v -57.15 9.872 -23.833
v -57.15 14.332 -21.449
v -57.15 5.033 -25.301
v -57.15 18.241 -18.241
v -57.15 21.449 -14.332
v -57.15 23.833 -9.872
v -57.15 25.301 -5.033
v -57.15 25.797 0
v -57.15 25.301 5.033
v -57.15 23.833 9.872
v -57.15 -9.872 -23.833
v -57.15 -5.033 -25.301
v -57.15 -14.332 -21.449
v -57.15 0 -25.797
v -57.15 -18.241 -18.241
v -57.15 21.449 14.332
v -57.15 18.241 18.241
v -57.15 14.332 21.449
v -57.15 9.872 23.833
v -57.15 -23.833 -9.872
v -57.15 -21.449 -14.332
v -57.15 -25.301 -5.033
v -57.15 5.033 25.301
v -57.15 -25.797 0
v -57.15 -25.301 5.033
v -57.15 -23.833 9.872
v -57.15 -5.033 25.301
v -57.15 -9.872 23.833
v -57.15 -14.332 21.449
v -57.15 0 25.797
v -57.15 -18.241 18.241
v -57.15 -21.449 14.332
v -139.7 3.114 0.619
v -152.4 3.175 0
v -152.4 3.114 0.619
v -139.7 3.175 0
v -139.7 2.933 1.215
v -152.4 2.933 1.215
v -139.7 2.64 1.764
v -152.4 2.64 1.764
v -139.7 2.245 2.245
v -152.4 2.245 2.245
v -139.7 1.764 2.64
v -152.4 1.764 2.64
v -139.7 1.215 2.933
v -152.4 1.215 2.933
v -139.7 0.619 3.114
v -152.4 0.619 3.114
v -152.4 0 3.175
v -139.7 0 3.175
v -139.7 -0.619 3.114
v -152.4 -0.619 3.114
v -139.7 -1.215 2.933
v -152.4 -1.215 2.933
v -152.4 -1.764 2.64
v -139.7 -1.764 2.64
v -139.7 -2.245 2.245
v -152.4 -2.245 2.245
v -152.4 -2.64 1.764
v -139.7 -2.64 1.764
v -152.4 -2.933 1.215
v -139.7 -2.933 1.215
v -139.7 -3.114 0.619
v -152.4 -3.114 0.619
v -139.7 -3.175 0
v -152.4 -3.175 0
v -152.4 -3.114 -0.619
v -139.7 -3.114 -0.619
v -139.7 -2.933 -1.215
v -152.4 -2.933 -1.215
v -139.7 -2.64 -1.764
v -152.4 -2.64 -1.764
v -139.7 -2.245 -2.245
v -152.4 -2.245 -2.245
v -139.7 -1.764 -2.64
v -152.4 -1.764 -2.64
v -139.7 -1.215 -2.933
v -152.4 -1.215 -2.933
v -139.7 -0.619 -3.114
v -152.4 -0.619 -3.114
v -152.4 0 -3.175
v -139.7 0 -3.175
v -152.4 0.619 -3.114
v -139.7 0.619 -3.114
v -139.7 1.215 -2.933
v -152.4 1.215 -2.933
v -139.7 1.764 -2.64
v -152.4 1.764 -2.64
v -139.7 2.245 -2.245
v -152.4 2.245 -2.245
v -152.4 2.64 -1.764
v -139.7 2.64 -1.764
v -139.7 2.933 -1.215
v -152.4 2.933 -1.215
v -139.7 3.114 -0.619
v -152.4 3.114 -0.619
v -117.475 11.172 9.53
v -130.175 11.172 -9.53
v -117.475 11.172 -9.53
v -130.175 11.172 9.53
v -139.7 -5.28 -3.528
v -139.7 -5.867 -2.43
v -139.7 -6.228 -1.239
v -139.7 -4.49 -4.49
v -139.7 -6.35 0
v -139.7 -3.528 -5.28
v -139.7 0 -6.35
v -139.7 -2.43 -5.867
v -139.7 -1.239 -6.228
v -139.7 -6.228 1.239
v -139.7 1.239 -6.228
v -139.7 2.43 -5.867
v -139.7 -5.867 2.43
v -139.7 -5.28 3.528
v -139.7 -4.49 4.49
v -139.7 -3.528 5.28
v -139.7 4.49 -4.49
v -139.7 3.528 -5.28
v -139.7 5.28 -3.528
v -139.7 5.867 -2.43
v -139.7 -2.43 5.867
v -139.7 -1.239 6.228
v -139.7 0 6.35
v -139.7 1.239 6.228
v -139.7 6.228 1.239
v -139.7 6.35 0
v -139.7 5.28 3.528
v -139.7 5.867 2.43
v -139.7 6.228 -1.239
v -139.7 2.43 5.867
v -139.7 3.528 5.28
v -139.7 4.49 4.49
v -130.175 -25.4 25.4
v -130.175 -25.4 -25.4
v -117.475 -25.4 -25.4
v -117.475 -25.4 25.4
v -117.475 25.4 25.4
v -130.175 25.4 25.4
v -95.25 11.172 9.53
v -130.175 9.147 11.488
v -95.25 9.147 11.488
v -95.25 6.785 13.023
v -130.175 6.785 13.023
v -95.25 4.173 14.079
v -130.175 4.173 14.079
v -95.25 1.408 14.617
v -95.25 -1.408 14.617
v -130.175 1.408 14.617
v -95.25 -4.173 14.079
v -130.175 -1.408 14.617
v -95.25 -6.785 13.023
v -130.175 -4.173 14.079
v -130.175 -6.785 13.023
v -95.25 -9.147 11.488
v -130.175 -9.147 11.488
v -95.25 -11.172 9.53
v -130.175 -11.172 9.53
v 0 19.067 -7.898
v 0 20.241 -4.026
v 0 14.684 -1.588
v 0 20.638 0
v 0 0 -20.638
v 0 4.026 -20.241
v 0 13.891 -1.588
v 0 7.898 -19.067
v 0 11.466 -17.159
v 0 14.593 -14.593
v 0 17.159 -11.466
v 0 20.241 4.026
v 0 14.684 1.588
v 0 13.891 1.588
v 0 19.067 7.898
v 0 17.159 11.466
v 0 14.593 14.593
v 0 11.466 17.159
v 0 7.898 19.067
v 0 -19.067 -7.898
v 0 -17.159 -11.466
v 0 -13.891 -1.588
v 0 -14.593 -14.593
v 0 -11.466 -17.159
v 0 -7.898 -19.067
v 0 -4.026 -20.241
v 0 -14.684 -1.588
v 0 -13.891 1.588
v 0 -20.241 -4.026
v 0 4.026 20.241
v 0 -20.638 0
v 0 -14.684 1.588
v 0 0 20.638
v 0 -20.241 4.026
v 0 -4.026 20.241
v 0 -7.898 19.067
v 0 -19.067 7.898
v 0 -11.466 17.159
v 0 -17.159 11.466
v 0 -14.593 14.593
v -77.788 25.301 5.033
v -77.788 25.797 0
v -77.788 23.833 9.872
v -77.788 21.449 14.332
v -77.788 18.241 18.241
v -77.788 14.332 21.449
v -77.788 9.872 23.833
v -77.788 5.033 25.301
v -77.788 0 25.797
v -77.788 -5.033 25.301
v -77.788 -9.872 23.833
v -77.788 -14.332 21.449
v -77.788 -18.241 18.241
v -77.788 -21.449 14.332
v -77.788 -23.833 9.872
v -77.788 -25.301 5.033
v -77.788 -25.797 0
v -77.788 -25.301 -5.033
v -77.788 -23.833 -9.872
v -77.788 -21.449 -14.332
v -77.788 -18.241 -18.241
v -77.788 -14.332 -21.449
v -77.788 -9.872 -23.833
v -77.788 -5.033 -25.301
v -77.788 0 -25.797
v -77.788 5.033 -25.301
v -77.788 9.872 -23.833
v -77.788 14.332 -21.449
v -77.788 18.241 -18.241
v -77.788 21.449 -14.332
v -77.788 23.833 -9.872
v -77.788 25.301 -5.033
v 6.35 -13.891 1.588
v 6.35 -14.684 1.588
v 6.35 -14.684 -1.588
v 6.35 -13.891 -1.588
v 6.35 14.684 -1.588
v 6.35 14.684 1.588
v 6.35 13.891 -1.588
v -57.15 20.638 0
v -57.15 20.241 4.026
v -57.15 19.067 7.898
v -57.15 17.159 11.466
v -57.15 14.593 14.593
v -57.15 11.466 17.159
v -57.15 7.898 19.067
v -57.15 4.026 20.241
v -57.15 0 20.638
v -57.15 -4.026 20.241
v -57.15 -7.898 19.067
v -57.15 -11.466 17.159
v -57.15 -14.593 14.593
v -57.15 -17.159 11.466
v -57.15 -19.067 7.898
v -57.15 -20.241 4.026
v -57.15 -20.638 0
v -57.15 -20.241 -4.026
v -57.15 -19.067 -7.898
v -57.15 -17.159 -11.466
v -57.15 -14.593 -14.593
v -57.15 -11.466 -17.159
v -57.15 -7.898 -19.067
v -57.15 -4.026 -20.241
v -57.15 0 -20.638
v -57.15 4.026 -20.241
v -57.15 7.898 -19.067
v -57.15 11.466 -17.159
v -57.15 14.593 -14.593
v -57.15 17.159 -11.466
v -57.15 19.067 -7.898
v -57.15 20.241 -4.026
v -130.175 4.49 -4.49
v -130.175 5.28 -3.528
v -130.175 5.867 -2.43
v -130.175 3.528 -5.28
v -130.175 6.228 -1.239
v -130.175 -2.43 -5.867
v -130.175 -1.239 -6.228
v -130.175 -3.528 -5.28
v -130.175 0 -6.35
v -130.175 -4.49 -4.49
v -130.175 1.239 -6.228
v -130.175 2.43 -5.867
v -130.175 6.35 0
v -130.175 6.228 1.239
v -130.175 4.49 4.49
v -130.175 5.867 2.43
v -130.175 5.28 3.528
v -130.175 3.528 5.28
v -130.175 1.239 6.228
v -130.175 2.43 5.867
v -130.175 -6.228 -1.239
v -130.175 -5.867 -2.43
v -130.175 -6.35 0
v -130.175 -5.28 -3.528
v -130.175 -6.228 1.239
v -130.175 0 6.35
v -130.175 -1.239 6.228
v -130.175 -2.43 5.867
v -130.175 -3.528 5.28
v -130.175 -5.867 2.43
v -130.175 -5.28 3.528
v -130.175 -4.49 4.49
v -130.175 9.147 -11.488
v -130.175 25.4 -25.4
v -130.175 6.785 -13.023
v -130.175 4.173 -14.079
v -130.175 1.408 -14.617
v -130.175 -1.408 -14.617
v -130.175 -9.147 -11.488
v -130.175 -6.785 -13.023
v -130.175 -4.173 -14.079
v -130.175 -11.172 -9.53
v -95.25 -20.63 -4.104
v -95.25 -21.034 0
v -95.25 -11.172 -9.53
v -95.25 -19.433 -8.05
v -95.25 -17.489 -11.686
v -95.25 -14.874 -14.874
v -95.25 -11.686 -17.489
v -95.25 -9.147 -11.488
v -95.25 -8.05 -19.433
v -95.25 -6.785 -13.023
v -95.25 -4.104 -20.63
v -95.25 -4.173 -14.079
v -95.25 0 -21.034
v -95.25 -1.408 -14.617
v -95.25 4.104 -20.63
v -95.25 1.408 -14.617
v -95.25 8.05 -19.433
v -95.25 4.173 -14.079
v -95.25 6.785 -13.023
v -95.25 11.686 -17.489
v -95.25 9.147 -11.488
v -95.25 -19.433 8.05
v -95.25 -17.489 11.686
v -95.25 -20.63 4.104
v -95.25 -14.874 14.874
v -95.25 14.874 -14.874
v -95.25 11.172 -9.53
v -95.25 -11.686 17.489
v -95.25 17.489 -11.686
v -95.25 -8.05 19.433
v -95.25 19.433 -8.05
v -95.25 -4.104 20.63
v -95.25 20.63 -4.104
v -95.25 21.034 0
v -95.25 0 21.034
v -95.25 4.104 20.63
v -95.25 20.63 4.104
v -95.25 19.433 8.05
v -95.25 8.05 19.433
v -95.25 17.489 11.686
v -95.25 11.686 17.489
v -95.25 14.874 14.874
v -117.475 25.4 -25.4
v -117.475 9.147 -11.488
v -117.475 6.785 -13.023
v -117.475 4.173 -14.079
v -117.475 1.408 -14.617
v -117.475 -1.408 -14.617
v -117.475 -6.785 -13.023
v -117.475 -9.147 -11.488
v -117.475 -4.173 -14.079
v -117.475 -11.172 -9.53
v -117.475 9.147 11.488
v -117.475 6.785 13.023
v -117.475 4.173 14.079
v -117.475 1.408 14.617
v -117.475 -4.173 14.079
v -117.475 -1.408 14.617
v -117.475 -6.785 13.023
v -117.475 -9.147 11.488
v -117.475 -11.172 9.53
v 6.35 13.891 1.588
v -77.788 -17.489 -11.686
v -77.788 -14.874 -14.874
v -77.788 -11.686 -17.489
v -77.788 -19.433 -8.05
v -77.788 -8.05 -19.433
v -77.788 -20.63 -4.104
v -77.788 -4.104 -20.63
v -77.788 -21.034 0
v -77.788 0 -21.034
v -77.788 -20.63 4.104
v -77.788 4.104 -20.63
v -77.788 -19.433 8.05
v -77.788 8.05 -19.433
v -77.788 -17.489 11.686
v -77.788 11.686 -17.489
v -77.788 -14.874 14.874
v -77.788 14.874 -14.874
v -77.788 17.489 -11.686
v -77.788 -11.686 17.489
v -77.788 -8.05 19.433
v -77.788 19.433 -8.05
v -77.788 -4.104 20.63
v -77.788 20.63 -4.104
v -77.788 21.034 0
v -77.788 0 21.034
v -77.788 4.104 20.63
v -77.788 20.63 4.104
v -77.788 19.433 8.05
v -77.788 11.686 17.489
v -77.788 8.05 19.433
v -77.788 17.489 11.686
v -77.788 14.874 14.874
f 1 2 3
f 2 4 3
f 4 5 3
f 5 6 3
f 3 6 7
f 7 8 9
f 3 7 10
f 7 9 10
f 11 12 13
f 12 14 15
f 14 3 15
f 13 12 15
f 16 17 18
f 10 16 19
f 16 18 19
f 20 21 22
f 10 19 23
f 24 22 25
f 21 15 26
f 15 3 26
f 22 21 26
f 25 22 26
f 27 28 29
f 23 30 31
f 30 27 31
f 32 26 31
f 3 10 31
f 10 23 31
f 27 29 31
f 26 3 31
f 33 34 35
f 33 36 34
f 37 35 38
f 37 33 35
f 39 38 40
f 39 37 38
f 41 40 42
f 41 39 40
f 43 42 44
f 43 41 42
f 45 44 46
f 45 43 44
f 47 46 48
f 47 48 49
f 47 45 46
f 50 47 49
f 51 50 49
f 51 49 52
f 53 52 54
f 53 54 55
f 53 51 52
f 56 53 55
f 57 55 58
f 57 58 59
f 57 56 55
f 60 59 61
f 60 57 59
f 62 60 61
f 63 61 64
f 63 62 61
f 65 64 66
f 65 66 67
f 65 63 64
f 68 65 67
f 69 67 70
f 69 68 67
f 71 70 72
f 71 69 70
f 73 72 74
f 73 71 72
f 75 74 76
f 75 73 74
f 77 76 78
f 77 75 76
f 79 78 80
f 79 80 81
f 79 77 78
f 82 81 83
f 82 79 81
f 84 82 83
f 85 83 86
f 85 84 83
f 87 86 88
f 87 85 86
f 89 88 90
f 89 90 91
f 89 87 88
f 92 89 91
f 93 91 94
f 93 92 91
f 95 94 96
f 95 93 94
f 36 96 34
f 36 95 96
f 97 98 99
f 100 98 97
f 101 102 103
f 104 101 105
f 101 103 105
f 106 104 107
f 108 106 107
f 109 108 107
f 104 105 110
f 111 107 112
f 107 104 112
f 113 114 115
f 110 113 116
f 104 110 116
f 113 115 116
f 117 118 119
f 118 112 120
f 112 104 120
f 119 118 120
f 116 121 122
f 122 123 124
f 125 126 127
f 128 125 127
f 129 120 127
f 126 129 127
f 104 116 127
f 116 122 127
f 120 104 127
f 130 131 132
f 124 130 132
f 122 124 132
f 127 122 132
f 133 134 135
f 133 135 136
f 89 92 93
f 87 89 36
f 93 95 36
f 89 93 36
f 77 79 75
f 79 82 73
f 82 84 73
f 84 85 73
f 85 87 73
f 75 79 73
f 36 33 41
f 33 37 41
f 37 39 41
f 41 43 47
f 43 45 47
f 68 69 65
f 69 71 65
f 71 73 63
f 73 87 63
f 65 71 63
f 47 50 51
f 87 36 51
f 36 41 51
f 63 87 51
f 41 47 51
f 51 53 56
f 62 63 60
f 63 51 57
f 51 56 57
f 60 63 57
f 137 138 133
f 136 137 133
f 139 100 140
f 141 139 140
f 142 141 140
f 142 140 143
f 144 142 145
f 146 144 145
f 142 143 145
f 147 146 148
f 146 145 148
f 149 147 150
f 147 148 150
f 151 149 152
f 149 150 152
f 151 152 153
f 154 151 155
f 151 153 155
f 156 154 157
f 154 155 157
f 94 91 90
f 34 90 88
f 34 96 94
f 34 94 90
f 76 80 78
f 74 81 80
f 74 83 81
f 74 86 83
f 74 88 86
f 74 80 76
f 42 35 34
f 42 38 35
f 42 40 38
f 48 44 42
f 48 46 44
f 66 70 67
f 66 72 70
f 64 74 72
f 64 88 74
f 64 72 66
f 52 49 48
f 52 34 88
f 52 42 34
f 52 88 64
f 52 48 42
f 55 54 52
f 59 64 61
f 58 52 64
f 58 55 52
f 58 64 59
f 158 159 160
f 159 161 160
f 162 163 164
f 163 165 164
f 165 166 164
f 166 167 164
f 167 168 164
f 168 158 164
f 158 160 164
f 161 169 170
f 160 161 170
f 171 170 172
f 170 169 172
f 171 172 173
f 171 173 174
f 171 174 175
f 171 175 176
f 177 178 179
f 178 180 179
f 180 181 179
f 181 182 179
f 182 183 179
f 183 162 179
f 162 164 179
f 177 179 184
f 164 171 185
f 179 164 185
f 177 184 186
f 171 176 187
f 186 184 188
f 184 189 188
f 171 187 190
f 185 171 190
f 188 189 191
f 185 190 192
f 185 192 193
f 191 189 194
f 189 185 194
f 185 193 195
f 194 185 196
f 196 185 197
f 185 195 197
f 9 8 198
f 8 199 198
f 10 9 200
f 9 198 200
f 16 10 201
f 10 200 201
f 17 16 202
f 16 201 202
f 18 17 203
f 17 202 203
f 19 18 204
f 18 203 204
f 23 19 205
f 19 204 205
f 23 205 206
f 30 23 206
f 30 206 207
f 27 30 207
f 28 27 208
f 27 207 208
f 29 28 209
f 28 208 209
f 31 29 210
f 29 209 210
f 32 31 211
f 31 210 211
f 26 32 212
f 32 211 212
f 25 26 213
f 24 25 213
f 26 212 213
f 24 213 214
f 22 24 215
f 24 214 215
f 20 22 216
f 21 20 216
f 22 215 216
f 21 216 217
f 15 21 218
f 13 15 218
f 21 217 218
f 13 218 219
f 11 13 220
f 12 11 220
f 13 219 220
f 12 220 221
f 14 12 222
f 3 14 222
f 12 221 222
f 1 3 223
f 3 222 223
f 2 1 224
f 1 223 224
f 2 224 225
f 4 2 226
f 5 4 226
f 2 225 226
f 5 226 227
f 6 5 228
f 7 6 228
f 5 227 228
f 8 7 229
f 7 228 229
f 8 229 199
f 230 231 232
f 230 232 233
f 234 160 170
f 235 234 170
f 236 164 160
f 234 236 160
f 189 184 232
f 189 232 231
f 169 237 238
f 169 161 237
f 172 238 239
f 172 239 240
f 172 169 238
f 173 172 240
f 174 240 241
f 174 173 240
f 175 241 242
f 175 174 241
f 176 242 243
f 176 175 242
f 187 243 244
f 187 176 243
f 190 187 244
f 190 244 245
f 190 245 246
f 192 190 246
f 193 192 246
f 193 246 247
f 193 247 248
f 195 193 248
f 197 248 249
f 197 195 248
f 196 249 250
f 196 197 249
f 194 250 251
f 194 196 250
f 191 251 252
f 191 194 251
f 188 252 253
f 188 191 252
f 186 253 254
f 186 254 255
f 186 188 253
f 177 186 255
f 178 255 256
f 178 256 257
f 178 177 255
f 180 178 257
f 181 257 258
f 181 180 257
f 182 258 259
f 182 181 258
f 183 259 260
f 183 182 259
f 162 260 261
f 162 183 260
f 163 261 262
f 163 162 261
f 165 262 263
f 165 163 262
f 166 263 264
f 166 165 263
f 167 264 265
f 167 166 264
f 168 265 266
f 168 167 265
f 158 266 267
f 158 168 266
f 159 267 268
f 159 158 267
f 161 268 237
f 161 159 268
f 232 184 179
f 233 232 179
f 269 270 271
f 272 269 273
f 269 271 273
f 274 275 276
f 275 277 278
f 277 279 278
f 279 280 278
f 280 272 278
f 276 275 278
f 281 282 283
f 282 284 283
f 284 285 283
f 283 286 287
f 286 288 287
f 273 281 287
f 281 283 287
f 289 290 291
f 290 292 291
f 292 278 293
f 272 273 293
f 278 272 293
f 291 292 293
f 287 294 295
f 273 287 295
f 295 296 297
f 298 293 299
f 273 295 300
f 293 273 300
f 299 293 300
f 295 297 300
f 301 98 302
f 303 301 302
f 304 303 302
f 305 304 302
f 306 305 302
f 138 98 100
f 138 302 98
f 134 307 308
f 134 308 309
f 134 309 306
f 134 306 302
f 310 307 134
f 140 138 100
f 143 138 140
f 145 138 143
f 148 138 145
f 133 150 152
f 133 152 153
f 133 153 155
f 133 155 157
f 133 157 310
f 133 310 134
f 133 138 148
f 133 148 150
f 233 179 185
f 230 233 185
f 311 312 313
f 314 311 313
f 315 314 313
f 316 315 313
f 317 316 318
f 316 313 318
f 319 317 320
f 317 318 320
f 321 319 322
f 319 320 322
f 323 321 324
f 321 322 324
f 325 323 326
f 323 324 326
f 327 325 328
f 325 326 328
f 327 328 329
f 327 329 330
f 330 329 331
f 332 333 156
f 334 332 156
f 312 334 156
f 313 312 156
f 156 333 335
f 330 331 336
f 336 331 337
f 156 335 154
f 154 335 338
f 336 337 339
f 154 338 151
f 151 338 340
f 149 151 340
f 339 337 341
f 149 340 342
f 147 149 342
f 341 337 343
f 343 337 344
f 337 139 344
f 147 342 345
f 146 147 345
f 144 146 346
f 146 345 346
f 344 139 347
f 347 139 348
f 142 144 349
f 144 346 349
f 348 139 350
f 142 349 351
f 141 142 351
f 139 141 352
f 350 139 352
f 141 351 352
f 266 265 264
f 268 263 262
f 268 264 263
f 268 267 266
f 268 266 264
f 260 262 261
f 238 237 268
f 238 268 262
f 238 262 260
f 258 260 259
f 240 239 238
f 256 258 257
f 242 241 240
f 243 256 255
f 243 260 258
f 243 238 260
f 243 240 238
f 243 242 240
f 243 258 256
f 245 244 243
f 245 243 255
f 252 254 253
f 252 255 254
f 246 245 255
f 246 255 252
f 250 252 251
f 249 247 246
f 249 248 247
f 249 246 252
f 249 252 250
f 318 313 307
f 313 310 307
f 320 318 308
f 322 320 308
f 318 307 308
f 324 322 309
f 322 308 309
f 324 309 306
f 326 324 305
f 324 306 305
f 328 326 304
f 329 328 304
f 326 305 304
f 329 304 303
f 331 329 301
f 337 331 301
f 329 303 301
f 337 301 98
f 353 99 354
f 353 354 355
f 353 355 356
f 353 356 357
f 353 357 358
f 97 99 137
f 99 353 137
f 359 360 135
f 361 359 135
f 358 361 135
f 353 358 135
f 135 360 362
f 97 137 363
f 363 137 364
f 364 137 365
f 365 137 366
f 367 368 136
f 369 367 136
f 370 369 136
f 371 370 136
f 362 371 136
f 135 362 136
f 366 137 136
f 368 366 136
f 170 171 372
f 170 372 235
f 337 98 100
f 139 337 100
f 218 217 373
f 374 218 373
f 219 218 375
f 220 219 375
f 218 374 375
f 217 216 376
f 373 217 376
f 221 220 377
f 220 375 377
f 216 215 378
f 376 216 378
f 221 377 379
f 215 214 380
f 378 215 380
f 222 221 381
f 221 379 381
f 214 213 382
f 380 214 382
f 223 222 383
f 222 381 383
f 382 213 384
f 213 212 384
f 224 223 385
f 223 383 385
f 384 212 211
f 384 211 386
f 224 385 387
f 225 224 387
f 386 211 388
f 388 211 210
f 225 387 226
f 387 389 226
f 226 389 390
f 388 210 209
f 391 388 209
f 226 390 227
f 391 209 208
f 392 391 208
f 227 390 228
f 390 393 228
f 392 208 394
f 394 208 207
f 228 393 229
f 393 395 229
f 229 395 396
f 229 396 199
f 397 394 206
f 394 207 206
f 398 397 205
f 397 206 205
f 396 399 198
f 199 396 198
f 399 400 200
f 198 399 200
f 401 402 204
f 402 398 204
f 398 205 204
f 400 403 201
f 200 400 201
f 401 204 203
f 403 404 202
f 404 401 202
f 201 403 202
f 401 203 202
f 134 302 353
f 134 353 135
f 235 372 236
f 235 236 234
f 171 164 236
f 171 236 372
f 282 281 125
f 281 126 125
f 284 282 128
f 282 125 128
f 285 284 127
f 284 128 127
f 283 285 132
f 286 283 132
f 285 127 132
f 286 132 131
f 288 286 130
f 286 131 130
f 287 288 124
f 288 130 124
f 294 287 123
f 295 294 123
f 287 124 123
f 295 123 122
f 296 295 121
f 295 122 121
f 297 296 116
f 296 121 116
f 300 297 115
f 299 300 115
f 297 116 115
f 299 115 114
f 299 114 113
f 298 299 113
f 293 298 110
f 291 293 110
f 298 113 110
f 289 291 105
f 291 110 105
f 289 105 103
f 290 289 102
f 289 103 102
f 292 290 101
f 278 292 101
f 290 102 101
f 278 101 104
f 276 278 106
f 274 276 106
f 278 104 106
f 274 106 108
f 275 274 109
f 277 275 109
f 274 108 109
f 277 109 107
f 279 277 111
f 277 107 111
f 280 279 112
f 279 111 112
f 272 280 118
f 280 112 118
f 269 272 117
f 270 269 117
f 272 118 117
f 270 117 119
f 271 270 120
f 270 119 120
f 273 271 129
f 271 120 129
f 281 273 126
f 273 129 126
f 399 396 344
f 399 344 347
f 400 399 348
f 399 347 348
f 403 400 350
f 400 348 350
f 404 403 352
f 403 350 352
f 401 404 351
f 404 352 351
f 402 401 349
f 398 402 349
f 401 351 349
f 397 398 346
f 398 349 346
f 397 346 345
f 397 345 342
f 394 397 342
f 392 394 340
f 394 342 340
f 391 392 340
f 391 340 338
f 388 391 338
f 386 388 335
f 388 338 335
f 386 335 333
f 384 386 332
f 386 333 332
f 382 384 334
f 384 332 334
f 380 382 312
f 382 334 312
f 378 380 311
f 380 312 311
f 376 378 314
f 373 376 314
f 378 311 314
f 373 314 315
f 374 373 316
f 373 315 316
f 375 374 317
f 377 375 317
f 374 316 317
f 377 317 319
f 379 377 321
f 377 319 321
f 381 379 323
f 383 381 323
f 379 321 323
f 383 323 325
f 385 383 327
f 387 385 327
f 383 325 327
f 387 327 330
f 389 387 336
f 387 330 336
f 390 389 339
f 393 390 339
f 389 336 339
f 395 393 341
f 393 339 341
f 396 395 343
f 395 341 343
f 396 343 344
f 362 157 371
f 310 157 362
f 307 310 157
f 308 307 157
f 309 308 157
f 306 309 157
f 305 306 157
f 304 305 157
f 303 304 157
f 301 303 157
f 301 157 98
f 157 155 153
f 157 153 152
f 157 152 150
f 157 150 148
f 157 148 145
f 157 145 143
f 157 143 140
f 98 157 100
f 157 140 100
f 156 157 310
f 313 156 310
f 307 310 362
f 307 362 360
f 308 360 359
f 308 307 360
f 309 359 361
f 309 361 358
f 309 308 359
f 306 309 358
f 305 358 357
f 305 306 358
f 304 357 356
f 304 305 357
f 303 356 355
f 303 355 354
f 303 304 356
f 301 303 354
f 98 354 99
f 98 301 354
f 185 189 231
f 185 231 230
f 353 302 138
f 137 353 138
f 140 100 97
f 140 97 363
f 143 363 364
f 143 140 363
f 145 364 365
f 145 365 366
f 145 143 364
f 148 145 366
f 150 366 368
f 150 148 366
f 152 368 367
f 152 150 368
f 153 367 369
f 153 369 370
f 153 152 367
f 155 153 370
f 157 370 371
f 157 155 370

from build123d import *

# Parameters (mm, degrees)
F0_W      = 57.15
F0_H      = 20.6375
F0_W_2    = 12.7
F0_H_2    = 3.175
F6_DEPTH  = 34.925
F7_W      = 0.79375
F7_H      = 3.175
F8_DEPTH  = 6.35
F9_W      = 50.8
F9_H      = 50.8
F10_DEPTH = 12.7


with BuildPart() as f1:
    # F0 (on Top) → F1 (revolve)
    with BuildSketch(Plane.XY):
        Polygon((-130.175, 0), (-57.15, 0), (-57.15, 20.6375), (-57.15, 25.796875), (-77.7875, 25.796875), (-77.7875, 21.034375), (-95.25, 21.034375), (-95.25, 14.684375), (-130.175, 14.684375), (-130.175, 6.35), align=None)
    revolve(axis=Axis((-104.775, 0, 0), (1, 0, 0)))

    # F5 (on face) → F6 (cut, through all)
    with BuildSketch(Plane(origin=(-130.175, 0, 0), x_dir=(0, -1, 0), z_dir=(-1, 0, 0))):
        with BuildLine():
            Line((-11.1718425207, 0), (-14.684375, 0))
            ThreePointArc((-14.684375, 0), (-13.7782871605, -5.0783532826), (-11.1718425207, -9.5299949545))
            Line((-11.1718425207, -9.5299949545), (-11.1718425207, 0))
        make_face()
        with BuildLine():
            ThreePointArc((-11.1718425207, 9.5299949545), (-13.7782871605, 5.0783532826), (-14.684375, 0))
            Line((-14.684375, 0), (-11.1718425207, 0))
            Line((-11.1718425207, 0), (-11.1718425207, 9.5299949545))
        make_face()
        with BuildLine():
            ThreePointArc((14.684375, 0), (13.7782871605, 5.0783532826), (11.1718425207, 9.5299949545))
            Line((11.1718425207, 9.5299949545), (11.1718425207, -9.5299949545))
            ThreePointArc((11.1718425207, -9.5299949545), (13.7782871605, -5.0783532826), (14.684375, 0))
        make_face()
    extrude(amount=-F6_DEPTH, mode=Mode.SUBTRACT)


with BuildPart() as f2:
    # F0 (on Top) → F2 (revolve)
    with BuildSketch(Plane.XY):
        with Locations((-28.575, 10.31875)):
            Rectangle(F0_W, F0_H)
    revolve(axis=Axis((-28.575, 0, 0), (1, 0, 0)))

    # F7 (on face) → F8 (join)
    with BuildSketch(Plane.YZ):
        with Locations((-14.2875, 0)):
            Rectangle(F7_W, F7_H)
        with Locations((14.2875, 0)):
            Rectangle(F7_W, F7_H)
    extrude(amount=F8_DEPTH)


with BuildPart() as f3:
    # F0 (on Top) → F3 (revolve)
    with BuildSketch(Plane.XY):
        Polygon((-139.7, 0), (-130.175, 0), (-130.175, 6.35), (-139.7, 6.35), (-139.7, 3.175), align=None)
    revolve(axis=Axis((-104.775, 0, 0), (1, 0, 0)))


with BuildPart() as f4:
    # F0 (on Top) → F4 (revolve)
    with BuildSketch(Plane.XY):
        with Locations((-146.05, 1.5875)):
            Rectangle(F0_W_2, F0_H_2)
    revolve(axis=Axis((-104.775, 0, 0), (1, 0, 0)))


with BuildPart() as f10:
    # F9 (on face) → F10 (new body)
    with BuildSketch(Plane(origin=(-130.175, 0, 0), x_dir=(0, -1, 0), z_dir=(-1, 0, 0))):
        Rectangle(F9_W, F9_H)
        with BuildLine():
            Line((-11.1718425207, -9.5299949545), (-11.1718425207, 9.5299949545))
            ThreePointArc((-11.1718425207, 9.5299949545), (0, 14.684375), (11.1718425207, 9.5299949545))
            Line((11.1718425207, 9.5299949545), (11.1718425207, -9.5299949545))
            ThreePointArc((11.1718425207, -9.5299949545), (0, -14.684375), (-11.1718425207, -9.5299949545))
        make_face(mode=Mode.SUBTRACT)
    extrude(amount=-F10_DEPTH)


solid = Compound([f1.part, f2.part, f3.part, f4.part, f10.part])
